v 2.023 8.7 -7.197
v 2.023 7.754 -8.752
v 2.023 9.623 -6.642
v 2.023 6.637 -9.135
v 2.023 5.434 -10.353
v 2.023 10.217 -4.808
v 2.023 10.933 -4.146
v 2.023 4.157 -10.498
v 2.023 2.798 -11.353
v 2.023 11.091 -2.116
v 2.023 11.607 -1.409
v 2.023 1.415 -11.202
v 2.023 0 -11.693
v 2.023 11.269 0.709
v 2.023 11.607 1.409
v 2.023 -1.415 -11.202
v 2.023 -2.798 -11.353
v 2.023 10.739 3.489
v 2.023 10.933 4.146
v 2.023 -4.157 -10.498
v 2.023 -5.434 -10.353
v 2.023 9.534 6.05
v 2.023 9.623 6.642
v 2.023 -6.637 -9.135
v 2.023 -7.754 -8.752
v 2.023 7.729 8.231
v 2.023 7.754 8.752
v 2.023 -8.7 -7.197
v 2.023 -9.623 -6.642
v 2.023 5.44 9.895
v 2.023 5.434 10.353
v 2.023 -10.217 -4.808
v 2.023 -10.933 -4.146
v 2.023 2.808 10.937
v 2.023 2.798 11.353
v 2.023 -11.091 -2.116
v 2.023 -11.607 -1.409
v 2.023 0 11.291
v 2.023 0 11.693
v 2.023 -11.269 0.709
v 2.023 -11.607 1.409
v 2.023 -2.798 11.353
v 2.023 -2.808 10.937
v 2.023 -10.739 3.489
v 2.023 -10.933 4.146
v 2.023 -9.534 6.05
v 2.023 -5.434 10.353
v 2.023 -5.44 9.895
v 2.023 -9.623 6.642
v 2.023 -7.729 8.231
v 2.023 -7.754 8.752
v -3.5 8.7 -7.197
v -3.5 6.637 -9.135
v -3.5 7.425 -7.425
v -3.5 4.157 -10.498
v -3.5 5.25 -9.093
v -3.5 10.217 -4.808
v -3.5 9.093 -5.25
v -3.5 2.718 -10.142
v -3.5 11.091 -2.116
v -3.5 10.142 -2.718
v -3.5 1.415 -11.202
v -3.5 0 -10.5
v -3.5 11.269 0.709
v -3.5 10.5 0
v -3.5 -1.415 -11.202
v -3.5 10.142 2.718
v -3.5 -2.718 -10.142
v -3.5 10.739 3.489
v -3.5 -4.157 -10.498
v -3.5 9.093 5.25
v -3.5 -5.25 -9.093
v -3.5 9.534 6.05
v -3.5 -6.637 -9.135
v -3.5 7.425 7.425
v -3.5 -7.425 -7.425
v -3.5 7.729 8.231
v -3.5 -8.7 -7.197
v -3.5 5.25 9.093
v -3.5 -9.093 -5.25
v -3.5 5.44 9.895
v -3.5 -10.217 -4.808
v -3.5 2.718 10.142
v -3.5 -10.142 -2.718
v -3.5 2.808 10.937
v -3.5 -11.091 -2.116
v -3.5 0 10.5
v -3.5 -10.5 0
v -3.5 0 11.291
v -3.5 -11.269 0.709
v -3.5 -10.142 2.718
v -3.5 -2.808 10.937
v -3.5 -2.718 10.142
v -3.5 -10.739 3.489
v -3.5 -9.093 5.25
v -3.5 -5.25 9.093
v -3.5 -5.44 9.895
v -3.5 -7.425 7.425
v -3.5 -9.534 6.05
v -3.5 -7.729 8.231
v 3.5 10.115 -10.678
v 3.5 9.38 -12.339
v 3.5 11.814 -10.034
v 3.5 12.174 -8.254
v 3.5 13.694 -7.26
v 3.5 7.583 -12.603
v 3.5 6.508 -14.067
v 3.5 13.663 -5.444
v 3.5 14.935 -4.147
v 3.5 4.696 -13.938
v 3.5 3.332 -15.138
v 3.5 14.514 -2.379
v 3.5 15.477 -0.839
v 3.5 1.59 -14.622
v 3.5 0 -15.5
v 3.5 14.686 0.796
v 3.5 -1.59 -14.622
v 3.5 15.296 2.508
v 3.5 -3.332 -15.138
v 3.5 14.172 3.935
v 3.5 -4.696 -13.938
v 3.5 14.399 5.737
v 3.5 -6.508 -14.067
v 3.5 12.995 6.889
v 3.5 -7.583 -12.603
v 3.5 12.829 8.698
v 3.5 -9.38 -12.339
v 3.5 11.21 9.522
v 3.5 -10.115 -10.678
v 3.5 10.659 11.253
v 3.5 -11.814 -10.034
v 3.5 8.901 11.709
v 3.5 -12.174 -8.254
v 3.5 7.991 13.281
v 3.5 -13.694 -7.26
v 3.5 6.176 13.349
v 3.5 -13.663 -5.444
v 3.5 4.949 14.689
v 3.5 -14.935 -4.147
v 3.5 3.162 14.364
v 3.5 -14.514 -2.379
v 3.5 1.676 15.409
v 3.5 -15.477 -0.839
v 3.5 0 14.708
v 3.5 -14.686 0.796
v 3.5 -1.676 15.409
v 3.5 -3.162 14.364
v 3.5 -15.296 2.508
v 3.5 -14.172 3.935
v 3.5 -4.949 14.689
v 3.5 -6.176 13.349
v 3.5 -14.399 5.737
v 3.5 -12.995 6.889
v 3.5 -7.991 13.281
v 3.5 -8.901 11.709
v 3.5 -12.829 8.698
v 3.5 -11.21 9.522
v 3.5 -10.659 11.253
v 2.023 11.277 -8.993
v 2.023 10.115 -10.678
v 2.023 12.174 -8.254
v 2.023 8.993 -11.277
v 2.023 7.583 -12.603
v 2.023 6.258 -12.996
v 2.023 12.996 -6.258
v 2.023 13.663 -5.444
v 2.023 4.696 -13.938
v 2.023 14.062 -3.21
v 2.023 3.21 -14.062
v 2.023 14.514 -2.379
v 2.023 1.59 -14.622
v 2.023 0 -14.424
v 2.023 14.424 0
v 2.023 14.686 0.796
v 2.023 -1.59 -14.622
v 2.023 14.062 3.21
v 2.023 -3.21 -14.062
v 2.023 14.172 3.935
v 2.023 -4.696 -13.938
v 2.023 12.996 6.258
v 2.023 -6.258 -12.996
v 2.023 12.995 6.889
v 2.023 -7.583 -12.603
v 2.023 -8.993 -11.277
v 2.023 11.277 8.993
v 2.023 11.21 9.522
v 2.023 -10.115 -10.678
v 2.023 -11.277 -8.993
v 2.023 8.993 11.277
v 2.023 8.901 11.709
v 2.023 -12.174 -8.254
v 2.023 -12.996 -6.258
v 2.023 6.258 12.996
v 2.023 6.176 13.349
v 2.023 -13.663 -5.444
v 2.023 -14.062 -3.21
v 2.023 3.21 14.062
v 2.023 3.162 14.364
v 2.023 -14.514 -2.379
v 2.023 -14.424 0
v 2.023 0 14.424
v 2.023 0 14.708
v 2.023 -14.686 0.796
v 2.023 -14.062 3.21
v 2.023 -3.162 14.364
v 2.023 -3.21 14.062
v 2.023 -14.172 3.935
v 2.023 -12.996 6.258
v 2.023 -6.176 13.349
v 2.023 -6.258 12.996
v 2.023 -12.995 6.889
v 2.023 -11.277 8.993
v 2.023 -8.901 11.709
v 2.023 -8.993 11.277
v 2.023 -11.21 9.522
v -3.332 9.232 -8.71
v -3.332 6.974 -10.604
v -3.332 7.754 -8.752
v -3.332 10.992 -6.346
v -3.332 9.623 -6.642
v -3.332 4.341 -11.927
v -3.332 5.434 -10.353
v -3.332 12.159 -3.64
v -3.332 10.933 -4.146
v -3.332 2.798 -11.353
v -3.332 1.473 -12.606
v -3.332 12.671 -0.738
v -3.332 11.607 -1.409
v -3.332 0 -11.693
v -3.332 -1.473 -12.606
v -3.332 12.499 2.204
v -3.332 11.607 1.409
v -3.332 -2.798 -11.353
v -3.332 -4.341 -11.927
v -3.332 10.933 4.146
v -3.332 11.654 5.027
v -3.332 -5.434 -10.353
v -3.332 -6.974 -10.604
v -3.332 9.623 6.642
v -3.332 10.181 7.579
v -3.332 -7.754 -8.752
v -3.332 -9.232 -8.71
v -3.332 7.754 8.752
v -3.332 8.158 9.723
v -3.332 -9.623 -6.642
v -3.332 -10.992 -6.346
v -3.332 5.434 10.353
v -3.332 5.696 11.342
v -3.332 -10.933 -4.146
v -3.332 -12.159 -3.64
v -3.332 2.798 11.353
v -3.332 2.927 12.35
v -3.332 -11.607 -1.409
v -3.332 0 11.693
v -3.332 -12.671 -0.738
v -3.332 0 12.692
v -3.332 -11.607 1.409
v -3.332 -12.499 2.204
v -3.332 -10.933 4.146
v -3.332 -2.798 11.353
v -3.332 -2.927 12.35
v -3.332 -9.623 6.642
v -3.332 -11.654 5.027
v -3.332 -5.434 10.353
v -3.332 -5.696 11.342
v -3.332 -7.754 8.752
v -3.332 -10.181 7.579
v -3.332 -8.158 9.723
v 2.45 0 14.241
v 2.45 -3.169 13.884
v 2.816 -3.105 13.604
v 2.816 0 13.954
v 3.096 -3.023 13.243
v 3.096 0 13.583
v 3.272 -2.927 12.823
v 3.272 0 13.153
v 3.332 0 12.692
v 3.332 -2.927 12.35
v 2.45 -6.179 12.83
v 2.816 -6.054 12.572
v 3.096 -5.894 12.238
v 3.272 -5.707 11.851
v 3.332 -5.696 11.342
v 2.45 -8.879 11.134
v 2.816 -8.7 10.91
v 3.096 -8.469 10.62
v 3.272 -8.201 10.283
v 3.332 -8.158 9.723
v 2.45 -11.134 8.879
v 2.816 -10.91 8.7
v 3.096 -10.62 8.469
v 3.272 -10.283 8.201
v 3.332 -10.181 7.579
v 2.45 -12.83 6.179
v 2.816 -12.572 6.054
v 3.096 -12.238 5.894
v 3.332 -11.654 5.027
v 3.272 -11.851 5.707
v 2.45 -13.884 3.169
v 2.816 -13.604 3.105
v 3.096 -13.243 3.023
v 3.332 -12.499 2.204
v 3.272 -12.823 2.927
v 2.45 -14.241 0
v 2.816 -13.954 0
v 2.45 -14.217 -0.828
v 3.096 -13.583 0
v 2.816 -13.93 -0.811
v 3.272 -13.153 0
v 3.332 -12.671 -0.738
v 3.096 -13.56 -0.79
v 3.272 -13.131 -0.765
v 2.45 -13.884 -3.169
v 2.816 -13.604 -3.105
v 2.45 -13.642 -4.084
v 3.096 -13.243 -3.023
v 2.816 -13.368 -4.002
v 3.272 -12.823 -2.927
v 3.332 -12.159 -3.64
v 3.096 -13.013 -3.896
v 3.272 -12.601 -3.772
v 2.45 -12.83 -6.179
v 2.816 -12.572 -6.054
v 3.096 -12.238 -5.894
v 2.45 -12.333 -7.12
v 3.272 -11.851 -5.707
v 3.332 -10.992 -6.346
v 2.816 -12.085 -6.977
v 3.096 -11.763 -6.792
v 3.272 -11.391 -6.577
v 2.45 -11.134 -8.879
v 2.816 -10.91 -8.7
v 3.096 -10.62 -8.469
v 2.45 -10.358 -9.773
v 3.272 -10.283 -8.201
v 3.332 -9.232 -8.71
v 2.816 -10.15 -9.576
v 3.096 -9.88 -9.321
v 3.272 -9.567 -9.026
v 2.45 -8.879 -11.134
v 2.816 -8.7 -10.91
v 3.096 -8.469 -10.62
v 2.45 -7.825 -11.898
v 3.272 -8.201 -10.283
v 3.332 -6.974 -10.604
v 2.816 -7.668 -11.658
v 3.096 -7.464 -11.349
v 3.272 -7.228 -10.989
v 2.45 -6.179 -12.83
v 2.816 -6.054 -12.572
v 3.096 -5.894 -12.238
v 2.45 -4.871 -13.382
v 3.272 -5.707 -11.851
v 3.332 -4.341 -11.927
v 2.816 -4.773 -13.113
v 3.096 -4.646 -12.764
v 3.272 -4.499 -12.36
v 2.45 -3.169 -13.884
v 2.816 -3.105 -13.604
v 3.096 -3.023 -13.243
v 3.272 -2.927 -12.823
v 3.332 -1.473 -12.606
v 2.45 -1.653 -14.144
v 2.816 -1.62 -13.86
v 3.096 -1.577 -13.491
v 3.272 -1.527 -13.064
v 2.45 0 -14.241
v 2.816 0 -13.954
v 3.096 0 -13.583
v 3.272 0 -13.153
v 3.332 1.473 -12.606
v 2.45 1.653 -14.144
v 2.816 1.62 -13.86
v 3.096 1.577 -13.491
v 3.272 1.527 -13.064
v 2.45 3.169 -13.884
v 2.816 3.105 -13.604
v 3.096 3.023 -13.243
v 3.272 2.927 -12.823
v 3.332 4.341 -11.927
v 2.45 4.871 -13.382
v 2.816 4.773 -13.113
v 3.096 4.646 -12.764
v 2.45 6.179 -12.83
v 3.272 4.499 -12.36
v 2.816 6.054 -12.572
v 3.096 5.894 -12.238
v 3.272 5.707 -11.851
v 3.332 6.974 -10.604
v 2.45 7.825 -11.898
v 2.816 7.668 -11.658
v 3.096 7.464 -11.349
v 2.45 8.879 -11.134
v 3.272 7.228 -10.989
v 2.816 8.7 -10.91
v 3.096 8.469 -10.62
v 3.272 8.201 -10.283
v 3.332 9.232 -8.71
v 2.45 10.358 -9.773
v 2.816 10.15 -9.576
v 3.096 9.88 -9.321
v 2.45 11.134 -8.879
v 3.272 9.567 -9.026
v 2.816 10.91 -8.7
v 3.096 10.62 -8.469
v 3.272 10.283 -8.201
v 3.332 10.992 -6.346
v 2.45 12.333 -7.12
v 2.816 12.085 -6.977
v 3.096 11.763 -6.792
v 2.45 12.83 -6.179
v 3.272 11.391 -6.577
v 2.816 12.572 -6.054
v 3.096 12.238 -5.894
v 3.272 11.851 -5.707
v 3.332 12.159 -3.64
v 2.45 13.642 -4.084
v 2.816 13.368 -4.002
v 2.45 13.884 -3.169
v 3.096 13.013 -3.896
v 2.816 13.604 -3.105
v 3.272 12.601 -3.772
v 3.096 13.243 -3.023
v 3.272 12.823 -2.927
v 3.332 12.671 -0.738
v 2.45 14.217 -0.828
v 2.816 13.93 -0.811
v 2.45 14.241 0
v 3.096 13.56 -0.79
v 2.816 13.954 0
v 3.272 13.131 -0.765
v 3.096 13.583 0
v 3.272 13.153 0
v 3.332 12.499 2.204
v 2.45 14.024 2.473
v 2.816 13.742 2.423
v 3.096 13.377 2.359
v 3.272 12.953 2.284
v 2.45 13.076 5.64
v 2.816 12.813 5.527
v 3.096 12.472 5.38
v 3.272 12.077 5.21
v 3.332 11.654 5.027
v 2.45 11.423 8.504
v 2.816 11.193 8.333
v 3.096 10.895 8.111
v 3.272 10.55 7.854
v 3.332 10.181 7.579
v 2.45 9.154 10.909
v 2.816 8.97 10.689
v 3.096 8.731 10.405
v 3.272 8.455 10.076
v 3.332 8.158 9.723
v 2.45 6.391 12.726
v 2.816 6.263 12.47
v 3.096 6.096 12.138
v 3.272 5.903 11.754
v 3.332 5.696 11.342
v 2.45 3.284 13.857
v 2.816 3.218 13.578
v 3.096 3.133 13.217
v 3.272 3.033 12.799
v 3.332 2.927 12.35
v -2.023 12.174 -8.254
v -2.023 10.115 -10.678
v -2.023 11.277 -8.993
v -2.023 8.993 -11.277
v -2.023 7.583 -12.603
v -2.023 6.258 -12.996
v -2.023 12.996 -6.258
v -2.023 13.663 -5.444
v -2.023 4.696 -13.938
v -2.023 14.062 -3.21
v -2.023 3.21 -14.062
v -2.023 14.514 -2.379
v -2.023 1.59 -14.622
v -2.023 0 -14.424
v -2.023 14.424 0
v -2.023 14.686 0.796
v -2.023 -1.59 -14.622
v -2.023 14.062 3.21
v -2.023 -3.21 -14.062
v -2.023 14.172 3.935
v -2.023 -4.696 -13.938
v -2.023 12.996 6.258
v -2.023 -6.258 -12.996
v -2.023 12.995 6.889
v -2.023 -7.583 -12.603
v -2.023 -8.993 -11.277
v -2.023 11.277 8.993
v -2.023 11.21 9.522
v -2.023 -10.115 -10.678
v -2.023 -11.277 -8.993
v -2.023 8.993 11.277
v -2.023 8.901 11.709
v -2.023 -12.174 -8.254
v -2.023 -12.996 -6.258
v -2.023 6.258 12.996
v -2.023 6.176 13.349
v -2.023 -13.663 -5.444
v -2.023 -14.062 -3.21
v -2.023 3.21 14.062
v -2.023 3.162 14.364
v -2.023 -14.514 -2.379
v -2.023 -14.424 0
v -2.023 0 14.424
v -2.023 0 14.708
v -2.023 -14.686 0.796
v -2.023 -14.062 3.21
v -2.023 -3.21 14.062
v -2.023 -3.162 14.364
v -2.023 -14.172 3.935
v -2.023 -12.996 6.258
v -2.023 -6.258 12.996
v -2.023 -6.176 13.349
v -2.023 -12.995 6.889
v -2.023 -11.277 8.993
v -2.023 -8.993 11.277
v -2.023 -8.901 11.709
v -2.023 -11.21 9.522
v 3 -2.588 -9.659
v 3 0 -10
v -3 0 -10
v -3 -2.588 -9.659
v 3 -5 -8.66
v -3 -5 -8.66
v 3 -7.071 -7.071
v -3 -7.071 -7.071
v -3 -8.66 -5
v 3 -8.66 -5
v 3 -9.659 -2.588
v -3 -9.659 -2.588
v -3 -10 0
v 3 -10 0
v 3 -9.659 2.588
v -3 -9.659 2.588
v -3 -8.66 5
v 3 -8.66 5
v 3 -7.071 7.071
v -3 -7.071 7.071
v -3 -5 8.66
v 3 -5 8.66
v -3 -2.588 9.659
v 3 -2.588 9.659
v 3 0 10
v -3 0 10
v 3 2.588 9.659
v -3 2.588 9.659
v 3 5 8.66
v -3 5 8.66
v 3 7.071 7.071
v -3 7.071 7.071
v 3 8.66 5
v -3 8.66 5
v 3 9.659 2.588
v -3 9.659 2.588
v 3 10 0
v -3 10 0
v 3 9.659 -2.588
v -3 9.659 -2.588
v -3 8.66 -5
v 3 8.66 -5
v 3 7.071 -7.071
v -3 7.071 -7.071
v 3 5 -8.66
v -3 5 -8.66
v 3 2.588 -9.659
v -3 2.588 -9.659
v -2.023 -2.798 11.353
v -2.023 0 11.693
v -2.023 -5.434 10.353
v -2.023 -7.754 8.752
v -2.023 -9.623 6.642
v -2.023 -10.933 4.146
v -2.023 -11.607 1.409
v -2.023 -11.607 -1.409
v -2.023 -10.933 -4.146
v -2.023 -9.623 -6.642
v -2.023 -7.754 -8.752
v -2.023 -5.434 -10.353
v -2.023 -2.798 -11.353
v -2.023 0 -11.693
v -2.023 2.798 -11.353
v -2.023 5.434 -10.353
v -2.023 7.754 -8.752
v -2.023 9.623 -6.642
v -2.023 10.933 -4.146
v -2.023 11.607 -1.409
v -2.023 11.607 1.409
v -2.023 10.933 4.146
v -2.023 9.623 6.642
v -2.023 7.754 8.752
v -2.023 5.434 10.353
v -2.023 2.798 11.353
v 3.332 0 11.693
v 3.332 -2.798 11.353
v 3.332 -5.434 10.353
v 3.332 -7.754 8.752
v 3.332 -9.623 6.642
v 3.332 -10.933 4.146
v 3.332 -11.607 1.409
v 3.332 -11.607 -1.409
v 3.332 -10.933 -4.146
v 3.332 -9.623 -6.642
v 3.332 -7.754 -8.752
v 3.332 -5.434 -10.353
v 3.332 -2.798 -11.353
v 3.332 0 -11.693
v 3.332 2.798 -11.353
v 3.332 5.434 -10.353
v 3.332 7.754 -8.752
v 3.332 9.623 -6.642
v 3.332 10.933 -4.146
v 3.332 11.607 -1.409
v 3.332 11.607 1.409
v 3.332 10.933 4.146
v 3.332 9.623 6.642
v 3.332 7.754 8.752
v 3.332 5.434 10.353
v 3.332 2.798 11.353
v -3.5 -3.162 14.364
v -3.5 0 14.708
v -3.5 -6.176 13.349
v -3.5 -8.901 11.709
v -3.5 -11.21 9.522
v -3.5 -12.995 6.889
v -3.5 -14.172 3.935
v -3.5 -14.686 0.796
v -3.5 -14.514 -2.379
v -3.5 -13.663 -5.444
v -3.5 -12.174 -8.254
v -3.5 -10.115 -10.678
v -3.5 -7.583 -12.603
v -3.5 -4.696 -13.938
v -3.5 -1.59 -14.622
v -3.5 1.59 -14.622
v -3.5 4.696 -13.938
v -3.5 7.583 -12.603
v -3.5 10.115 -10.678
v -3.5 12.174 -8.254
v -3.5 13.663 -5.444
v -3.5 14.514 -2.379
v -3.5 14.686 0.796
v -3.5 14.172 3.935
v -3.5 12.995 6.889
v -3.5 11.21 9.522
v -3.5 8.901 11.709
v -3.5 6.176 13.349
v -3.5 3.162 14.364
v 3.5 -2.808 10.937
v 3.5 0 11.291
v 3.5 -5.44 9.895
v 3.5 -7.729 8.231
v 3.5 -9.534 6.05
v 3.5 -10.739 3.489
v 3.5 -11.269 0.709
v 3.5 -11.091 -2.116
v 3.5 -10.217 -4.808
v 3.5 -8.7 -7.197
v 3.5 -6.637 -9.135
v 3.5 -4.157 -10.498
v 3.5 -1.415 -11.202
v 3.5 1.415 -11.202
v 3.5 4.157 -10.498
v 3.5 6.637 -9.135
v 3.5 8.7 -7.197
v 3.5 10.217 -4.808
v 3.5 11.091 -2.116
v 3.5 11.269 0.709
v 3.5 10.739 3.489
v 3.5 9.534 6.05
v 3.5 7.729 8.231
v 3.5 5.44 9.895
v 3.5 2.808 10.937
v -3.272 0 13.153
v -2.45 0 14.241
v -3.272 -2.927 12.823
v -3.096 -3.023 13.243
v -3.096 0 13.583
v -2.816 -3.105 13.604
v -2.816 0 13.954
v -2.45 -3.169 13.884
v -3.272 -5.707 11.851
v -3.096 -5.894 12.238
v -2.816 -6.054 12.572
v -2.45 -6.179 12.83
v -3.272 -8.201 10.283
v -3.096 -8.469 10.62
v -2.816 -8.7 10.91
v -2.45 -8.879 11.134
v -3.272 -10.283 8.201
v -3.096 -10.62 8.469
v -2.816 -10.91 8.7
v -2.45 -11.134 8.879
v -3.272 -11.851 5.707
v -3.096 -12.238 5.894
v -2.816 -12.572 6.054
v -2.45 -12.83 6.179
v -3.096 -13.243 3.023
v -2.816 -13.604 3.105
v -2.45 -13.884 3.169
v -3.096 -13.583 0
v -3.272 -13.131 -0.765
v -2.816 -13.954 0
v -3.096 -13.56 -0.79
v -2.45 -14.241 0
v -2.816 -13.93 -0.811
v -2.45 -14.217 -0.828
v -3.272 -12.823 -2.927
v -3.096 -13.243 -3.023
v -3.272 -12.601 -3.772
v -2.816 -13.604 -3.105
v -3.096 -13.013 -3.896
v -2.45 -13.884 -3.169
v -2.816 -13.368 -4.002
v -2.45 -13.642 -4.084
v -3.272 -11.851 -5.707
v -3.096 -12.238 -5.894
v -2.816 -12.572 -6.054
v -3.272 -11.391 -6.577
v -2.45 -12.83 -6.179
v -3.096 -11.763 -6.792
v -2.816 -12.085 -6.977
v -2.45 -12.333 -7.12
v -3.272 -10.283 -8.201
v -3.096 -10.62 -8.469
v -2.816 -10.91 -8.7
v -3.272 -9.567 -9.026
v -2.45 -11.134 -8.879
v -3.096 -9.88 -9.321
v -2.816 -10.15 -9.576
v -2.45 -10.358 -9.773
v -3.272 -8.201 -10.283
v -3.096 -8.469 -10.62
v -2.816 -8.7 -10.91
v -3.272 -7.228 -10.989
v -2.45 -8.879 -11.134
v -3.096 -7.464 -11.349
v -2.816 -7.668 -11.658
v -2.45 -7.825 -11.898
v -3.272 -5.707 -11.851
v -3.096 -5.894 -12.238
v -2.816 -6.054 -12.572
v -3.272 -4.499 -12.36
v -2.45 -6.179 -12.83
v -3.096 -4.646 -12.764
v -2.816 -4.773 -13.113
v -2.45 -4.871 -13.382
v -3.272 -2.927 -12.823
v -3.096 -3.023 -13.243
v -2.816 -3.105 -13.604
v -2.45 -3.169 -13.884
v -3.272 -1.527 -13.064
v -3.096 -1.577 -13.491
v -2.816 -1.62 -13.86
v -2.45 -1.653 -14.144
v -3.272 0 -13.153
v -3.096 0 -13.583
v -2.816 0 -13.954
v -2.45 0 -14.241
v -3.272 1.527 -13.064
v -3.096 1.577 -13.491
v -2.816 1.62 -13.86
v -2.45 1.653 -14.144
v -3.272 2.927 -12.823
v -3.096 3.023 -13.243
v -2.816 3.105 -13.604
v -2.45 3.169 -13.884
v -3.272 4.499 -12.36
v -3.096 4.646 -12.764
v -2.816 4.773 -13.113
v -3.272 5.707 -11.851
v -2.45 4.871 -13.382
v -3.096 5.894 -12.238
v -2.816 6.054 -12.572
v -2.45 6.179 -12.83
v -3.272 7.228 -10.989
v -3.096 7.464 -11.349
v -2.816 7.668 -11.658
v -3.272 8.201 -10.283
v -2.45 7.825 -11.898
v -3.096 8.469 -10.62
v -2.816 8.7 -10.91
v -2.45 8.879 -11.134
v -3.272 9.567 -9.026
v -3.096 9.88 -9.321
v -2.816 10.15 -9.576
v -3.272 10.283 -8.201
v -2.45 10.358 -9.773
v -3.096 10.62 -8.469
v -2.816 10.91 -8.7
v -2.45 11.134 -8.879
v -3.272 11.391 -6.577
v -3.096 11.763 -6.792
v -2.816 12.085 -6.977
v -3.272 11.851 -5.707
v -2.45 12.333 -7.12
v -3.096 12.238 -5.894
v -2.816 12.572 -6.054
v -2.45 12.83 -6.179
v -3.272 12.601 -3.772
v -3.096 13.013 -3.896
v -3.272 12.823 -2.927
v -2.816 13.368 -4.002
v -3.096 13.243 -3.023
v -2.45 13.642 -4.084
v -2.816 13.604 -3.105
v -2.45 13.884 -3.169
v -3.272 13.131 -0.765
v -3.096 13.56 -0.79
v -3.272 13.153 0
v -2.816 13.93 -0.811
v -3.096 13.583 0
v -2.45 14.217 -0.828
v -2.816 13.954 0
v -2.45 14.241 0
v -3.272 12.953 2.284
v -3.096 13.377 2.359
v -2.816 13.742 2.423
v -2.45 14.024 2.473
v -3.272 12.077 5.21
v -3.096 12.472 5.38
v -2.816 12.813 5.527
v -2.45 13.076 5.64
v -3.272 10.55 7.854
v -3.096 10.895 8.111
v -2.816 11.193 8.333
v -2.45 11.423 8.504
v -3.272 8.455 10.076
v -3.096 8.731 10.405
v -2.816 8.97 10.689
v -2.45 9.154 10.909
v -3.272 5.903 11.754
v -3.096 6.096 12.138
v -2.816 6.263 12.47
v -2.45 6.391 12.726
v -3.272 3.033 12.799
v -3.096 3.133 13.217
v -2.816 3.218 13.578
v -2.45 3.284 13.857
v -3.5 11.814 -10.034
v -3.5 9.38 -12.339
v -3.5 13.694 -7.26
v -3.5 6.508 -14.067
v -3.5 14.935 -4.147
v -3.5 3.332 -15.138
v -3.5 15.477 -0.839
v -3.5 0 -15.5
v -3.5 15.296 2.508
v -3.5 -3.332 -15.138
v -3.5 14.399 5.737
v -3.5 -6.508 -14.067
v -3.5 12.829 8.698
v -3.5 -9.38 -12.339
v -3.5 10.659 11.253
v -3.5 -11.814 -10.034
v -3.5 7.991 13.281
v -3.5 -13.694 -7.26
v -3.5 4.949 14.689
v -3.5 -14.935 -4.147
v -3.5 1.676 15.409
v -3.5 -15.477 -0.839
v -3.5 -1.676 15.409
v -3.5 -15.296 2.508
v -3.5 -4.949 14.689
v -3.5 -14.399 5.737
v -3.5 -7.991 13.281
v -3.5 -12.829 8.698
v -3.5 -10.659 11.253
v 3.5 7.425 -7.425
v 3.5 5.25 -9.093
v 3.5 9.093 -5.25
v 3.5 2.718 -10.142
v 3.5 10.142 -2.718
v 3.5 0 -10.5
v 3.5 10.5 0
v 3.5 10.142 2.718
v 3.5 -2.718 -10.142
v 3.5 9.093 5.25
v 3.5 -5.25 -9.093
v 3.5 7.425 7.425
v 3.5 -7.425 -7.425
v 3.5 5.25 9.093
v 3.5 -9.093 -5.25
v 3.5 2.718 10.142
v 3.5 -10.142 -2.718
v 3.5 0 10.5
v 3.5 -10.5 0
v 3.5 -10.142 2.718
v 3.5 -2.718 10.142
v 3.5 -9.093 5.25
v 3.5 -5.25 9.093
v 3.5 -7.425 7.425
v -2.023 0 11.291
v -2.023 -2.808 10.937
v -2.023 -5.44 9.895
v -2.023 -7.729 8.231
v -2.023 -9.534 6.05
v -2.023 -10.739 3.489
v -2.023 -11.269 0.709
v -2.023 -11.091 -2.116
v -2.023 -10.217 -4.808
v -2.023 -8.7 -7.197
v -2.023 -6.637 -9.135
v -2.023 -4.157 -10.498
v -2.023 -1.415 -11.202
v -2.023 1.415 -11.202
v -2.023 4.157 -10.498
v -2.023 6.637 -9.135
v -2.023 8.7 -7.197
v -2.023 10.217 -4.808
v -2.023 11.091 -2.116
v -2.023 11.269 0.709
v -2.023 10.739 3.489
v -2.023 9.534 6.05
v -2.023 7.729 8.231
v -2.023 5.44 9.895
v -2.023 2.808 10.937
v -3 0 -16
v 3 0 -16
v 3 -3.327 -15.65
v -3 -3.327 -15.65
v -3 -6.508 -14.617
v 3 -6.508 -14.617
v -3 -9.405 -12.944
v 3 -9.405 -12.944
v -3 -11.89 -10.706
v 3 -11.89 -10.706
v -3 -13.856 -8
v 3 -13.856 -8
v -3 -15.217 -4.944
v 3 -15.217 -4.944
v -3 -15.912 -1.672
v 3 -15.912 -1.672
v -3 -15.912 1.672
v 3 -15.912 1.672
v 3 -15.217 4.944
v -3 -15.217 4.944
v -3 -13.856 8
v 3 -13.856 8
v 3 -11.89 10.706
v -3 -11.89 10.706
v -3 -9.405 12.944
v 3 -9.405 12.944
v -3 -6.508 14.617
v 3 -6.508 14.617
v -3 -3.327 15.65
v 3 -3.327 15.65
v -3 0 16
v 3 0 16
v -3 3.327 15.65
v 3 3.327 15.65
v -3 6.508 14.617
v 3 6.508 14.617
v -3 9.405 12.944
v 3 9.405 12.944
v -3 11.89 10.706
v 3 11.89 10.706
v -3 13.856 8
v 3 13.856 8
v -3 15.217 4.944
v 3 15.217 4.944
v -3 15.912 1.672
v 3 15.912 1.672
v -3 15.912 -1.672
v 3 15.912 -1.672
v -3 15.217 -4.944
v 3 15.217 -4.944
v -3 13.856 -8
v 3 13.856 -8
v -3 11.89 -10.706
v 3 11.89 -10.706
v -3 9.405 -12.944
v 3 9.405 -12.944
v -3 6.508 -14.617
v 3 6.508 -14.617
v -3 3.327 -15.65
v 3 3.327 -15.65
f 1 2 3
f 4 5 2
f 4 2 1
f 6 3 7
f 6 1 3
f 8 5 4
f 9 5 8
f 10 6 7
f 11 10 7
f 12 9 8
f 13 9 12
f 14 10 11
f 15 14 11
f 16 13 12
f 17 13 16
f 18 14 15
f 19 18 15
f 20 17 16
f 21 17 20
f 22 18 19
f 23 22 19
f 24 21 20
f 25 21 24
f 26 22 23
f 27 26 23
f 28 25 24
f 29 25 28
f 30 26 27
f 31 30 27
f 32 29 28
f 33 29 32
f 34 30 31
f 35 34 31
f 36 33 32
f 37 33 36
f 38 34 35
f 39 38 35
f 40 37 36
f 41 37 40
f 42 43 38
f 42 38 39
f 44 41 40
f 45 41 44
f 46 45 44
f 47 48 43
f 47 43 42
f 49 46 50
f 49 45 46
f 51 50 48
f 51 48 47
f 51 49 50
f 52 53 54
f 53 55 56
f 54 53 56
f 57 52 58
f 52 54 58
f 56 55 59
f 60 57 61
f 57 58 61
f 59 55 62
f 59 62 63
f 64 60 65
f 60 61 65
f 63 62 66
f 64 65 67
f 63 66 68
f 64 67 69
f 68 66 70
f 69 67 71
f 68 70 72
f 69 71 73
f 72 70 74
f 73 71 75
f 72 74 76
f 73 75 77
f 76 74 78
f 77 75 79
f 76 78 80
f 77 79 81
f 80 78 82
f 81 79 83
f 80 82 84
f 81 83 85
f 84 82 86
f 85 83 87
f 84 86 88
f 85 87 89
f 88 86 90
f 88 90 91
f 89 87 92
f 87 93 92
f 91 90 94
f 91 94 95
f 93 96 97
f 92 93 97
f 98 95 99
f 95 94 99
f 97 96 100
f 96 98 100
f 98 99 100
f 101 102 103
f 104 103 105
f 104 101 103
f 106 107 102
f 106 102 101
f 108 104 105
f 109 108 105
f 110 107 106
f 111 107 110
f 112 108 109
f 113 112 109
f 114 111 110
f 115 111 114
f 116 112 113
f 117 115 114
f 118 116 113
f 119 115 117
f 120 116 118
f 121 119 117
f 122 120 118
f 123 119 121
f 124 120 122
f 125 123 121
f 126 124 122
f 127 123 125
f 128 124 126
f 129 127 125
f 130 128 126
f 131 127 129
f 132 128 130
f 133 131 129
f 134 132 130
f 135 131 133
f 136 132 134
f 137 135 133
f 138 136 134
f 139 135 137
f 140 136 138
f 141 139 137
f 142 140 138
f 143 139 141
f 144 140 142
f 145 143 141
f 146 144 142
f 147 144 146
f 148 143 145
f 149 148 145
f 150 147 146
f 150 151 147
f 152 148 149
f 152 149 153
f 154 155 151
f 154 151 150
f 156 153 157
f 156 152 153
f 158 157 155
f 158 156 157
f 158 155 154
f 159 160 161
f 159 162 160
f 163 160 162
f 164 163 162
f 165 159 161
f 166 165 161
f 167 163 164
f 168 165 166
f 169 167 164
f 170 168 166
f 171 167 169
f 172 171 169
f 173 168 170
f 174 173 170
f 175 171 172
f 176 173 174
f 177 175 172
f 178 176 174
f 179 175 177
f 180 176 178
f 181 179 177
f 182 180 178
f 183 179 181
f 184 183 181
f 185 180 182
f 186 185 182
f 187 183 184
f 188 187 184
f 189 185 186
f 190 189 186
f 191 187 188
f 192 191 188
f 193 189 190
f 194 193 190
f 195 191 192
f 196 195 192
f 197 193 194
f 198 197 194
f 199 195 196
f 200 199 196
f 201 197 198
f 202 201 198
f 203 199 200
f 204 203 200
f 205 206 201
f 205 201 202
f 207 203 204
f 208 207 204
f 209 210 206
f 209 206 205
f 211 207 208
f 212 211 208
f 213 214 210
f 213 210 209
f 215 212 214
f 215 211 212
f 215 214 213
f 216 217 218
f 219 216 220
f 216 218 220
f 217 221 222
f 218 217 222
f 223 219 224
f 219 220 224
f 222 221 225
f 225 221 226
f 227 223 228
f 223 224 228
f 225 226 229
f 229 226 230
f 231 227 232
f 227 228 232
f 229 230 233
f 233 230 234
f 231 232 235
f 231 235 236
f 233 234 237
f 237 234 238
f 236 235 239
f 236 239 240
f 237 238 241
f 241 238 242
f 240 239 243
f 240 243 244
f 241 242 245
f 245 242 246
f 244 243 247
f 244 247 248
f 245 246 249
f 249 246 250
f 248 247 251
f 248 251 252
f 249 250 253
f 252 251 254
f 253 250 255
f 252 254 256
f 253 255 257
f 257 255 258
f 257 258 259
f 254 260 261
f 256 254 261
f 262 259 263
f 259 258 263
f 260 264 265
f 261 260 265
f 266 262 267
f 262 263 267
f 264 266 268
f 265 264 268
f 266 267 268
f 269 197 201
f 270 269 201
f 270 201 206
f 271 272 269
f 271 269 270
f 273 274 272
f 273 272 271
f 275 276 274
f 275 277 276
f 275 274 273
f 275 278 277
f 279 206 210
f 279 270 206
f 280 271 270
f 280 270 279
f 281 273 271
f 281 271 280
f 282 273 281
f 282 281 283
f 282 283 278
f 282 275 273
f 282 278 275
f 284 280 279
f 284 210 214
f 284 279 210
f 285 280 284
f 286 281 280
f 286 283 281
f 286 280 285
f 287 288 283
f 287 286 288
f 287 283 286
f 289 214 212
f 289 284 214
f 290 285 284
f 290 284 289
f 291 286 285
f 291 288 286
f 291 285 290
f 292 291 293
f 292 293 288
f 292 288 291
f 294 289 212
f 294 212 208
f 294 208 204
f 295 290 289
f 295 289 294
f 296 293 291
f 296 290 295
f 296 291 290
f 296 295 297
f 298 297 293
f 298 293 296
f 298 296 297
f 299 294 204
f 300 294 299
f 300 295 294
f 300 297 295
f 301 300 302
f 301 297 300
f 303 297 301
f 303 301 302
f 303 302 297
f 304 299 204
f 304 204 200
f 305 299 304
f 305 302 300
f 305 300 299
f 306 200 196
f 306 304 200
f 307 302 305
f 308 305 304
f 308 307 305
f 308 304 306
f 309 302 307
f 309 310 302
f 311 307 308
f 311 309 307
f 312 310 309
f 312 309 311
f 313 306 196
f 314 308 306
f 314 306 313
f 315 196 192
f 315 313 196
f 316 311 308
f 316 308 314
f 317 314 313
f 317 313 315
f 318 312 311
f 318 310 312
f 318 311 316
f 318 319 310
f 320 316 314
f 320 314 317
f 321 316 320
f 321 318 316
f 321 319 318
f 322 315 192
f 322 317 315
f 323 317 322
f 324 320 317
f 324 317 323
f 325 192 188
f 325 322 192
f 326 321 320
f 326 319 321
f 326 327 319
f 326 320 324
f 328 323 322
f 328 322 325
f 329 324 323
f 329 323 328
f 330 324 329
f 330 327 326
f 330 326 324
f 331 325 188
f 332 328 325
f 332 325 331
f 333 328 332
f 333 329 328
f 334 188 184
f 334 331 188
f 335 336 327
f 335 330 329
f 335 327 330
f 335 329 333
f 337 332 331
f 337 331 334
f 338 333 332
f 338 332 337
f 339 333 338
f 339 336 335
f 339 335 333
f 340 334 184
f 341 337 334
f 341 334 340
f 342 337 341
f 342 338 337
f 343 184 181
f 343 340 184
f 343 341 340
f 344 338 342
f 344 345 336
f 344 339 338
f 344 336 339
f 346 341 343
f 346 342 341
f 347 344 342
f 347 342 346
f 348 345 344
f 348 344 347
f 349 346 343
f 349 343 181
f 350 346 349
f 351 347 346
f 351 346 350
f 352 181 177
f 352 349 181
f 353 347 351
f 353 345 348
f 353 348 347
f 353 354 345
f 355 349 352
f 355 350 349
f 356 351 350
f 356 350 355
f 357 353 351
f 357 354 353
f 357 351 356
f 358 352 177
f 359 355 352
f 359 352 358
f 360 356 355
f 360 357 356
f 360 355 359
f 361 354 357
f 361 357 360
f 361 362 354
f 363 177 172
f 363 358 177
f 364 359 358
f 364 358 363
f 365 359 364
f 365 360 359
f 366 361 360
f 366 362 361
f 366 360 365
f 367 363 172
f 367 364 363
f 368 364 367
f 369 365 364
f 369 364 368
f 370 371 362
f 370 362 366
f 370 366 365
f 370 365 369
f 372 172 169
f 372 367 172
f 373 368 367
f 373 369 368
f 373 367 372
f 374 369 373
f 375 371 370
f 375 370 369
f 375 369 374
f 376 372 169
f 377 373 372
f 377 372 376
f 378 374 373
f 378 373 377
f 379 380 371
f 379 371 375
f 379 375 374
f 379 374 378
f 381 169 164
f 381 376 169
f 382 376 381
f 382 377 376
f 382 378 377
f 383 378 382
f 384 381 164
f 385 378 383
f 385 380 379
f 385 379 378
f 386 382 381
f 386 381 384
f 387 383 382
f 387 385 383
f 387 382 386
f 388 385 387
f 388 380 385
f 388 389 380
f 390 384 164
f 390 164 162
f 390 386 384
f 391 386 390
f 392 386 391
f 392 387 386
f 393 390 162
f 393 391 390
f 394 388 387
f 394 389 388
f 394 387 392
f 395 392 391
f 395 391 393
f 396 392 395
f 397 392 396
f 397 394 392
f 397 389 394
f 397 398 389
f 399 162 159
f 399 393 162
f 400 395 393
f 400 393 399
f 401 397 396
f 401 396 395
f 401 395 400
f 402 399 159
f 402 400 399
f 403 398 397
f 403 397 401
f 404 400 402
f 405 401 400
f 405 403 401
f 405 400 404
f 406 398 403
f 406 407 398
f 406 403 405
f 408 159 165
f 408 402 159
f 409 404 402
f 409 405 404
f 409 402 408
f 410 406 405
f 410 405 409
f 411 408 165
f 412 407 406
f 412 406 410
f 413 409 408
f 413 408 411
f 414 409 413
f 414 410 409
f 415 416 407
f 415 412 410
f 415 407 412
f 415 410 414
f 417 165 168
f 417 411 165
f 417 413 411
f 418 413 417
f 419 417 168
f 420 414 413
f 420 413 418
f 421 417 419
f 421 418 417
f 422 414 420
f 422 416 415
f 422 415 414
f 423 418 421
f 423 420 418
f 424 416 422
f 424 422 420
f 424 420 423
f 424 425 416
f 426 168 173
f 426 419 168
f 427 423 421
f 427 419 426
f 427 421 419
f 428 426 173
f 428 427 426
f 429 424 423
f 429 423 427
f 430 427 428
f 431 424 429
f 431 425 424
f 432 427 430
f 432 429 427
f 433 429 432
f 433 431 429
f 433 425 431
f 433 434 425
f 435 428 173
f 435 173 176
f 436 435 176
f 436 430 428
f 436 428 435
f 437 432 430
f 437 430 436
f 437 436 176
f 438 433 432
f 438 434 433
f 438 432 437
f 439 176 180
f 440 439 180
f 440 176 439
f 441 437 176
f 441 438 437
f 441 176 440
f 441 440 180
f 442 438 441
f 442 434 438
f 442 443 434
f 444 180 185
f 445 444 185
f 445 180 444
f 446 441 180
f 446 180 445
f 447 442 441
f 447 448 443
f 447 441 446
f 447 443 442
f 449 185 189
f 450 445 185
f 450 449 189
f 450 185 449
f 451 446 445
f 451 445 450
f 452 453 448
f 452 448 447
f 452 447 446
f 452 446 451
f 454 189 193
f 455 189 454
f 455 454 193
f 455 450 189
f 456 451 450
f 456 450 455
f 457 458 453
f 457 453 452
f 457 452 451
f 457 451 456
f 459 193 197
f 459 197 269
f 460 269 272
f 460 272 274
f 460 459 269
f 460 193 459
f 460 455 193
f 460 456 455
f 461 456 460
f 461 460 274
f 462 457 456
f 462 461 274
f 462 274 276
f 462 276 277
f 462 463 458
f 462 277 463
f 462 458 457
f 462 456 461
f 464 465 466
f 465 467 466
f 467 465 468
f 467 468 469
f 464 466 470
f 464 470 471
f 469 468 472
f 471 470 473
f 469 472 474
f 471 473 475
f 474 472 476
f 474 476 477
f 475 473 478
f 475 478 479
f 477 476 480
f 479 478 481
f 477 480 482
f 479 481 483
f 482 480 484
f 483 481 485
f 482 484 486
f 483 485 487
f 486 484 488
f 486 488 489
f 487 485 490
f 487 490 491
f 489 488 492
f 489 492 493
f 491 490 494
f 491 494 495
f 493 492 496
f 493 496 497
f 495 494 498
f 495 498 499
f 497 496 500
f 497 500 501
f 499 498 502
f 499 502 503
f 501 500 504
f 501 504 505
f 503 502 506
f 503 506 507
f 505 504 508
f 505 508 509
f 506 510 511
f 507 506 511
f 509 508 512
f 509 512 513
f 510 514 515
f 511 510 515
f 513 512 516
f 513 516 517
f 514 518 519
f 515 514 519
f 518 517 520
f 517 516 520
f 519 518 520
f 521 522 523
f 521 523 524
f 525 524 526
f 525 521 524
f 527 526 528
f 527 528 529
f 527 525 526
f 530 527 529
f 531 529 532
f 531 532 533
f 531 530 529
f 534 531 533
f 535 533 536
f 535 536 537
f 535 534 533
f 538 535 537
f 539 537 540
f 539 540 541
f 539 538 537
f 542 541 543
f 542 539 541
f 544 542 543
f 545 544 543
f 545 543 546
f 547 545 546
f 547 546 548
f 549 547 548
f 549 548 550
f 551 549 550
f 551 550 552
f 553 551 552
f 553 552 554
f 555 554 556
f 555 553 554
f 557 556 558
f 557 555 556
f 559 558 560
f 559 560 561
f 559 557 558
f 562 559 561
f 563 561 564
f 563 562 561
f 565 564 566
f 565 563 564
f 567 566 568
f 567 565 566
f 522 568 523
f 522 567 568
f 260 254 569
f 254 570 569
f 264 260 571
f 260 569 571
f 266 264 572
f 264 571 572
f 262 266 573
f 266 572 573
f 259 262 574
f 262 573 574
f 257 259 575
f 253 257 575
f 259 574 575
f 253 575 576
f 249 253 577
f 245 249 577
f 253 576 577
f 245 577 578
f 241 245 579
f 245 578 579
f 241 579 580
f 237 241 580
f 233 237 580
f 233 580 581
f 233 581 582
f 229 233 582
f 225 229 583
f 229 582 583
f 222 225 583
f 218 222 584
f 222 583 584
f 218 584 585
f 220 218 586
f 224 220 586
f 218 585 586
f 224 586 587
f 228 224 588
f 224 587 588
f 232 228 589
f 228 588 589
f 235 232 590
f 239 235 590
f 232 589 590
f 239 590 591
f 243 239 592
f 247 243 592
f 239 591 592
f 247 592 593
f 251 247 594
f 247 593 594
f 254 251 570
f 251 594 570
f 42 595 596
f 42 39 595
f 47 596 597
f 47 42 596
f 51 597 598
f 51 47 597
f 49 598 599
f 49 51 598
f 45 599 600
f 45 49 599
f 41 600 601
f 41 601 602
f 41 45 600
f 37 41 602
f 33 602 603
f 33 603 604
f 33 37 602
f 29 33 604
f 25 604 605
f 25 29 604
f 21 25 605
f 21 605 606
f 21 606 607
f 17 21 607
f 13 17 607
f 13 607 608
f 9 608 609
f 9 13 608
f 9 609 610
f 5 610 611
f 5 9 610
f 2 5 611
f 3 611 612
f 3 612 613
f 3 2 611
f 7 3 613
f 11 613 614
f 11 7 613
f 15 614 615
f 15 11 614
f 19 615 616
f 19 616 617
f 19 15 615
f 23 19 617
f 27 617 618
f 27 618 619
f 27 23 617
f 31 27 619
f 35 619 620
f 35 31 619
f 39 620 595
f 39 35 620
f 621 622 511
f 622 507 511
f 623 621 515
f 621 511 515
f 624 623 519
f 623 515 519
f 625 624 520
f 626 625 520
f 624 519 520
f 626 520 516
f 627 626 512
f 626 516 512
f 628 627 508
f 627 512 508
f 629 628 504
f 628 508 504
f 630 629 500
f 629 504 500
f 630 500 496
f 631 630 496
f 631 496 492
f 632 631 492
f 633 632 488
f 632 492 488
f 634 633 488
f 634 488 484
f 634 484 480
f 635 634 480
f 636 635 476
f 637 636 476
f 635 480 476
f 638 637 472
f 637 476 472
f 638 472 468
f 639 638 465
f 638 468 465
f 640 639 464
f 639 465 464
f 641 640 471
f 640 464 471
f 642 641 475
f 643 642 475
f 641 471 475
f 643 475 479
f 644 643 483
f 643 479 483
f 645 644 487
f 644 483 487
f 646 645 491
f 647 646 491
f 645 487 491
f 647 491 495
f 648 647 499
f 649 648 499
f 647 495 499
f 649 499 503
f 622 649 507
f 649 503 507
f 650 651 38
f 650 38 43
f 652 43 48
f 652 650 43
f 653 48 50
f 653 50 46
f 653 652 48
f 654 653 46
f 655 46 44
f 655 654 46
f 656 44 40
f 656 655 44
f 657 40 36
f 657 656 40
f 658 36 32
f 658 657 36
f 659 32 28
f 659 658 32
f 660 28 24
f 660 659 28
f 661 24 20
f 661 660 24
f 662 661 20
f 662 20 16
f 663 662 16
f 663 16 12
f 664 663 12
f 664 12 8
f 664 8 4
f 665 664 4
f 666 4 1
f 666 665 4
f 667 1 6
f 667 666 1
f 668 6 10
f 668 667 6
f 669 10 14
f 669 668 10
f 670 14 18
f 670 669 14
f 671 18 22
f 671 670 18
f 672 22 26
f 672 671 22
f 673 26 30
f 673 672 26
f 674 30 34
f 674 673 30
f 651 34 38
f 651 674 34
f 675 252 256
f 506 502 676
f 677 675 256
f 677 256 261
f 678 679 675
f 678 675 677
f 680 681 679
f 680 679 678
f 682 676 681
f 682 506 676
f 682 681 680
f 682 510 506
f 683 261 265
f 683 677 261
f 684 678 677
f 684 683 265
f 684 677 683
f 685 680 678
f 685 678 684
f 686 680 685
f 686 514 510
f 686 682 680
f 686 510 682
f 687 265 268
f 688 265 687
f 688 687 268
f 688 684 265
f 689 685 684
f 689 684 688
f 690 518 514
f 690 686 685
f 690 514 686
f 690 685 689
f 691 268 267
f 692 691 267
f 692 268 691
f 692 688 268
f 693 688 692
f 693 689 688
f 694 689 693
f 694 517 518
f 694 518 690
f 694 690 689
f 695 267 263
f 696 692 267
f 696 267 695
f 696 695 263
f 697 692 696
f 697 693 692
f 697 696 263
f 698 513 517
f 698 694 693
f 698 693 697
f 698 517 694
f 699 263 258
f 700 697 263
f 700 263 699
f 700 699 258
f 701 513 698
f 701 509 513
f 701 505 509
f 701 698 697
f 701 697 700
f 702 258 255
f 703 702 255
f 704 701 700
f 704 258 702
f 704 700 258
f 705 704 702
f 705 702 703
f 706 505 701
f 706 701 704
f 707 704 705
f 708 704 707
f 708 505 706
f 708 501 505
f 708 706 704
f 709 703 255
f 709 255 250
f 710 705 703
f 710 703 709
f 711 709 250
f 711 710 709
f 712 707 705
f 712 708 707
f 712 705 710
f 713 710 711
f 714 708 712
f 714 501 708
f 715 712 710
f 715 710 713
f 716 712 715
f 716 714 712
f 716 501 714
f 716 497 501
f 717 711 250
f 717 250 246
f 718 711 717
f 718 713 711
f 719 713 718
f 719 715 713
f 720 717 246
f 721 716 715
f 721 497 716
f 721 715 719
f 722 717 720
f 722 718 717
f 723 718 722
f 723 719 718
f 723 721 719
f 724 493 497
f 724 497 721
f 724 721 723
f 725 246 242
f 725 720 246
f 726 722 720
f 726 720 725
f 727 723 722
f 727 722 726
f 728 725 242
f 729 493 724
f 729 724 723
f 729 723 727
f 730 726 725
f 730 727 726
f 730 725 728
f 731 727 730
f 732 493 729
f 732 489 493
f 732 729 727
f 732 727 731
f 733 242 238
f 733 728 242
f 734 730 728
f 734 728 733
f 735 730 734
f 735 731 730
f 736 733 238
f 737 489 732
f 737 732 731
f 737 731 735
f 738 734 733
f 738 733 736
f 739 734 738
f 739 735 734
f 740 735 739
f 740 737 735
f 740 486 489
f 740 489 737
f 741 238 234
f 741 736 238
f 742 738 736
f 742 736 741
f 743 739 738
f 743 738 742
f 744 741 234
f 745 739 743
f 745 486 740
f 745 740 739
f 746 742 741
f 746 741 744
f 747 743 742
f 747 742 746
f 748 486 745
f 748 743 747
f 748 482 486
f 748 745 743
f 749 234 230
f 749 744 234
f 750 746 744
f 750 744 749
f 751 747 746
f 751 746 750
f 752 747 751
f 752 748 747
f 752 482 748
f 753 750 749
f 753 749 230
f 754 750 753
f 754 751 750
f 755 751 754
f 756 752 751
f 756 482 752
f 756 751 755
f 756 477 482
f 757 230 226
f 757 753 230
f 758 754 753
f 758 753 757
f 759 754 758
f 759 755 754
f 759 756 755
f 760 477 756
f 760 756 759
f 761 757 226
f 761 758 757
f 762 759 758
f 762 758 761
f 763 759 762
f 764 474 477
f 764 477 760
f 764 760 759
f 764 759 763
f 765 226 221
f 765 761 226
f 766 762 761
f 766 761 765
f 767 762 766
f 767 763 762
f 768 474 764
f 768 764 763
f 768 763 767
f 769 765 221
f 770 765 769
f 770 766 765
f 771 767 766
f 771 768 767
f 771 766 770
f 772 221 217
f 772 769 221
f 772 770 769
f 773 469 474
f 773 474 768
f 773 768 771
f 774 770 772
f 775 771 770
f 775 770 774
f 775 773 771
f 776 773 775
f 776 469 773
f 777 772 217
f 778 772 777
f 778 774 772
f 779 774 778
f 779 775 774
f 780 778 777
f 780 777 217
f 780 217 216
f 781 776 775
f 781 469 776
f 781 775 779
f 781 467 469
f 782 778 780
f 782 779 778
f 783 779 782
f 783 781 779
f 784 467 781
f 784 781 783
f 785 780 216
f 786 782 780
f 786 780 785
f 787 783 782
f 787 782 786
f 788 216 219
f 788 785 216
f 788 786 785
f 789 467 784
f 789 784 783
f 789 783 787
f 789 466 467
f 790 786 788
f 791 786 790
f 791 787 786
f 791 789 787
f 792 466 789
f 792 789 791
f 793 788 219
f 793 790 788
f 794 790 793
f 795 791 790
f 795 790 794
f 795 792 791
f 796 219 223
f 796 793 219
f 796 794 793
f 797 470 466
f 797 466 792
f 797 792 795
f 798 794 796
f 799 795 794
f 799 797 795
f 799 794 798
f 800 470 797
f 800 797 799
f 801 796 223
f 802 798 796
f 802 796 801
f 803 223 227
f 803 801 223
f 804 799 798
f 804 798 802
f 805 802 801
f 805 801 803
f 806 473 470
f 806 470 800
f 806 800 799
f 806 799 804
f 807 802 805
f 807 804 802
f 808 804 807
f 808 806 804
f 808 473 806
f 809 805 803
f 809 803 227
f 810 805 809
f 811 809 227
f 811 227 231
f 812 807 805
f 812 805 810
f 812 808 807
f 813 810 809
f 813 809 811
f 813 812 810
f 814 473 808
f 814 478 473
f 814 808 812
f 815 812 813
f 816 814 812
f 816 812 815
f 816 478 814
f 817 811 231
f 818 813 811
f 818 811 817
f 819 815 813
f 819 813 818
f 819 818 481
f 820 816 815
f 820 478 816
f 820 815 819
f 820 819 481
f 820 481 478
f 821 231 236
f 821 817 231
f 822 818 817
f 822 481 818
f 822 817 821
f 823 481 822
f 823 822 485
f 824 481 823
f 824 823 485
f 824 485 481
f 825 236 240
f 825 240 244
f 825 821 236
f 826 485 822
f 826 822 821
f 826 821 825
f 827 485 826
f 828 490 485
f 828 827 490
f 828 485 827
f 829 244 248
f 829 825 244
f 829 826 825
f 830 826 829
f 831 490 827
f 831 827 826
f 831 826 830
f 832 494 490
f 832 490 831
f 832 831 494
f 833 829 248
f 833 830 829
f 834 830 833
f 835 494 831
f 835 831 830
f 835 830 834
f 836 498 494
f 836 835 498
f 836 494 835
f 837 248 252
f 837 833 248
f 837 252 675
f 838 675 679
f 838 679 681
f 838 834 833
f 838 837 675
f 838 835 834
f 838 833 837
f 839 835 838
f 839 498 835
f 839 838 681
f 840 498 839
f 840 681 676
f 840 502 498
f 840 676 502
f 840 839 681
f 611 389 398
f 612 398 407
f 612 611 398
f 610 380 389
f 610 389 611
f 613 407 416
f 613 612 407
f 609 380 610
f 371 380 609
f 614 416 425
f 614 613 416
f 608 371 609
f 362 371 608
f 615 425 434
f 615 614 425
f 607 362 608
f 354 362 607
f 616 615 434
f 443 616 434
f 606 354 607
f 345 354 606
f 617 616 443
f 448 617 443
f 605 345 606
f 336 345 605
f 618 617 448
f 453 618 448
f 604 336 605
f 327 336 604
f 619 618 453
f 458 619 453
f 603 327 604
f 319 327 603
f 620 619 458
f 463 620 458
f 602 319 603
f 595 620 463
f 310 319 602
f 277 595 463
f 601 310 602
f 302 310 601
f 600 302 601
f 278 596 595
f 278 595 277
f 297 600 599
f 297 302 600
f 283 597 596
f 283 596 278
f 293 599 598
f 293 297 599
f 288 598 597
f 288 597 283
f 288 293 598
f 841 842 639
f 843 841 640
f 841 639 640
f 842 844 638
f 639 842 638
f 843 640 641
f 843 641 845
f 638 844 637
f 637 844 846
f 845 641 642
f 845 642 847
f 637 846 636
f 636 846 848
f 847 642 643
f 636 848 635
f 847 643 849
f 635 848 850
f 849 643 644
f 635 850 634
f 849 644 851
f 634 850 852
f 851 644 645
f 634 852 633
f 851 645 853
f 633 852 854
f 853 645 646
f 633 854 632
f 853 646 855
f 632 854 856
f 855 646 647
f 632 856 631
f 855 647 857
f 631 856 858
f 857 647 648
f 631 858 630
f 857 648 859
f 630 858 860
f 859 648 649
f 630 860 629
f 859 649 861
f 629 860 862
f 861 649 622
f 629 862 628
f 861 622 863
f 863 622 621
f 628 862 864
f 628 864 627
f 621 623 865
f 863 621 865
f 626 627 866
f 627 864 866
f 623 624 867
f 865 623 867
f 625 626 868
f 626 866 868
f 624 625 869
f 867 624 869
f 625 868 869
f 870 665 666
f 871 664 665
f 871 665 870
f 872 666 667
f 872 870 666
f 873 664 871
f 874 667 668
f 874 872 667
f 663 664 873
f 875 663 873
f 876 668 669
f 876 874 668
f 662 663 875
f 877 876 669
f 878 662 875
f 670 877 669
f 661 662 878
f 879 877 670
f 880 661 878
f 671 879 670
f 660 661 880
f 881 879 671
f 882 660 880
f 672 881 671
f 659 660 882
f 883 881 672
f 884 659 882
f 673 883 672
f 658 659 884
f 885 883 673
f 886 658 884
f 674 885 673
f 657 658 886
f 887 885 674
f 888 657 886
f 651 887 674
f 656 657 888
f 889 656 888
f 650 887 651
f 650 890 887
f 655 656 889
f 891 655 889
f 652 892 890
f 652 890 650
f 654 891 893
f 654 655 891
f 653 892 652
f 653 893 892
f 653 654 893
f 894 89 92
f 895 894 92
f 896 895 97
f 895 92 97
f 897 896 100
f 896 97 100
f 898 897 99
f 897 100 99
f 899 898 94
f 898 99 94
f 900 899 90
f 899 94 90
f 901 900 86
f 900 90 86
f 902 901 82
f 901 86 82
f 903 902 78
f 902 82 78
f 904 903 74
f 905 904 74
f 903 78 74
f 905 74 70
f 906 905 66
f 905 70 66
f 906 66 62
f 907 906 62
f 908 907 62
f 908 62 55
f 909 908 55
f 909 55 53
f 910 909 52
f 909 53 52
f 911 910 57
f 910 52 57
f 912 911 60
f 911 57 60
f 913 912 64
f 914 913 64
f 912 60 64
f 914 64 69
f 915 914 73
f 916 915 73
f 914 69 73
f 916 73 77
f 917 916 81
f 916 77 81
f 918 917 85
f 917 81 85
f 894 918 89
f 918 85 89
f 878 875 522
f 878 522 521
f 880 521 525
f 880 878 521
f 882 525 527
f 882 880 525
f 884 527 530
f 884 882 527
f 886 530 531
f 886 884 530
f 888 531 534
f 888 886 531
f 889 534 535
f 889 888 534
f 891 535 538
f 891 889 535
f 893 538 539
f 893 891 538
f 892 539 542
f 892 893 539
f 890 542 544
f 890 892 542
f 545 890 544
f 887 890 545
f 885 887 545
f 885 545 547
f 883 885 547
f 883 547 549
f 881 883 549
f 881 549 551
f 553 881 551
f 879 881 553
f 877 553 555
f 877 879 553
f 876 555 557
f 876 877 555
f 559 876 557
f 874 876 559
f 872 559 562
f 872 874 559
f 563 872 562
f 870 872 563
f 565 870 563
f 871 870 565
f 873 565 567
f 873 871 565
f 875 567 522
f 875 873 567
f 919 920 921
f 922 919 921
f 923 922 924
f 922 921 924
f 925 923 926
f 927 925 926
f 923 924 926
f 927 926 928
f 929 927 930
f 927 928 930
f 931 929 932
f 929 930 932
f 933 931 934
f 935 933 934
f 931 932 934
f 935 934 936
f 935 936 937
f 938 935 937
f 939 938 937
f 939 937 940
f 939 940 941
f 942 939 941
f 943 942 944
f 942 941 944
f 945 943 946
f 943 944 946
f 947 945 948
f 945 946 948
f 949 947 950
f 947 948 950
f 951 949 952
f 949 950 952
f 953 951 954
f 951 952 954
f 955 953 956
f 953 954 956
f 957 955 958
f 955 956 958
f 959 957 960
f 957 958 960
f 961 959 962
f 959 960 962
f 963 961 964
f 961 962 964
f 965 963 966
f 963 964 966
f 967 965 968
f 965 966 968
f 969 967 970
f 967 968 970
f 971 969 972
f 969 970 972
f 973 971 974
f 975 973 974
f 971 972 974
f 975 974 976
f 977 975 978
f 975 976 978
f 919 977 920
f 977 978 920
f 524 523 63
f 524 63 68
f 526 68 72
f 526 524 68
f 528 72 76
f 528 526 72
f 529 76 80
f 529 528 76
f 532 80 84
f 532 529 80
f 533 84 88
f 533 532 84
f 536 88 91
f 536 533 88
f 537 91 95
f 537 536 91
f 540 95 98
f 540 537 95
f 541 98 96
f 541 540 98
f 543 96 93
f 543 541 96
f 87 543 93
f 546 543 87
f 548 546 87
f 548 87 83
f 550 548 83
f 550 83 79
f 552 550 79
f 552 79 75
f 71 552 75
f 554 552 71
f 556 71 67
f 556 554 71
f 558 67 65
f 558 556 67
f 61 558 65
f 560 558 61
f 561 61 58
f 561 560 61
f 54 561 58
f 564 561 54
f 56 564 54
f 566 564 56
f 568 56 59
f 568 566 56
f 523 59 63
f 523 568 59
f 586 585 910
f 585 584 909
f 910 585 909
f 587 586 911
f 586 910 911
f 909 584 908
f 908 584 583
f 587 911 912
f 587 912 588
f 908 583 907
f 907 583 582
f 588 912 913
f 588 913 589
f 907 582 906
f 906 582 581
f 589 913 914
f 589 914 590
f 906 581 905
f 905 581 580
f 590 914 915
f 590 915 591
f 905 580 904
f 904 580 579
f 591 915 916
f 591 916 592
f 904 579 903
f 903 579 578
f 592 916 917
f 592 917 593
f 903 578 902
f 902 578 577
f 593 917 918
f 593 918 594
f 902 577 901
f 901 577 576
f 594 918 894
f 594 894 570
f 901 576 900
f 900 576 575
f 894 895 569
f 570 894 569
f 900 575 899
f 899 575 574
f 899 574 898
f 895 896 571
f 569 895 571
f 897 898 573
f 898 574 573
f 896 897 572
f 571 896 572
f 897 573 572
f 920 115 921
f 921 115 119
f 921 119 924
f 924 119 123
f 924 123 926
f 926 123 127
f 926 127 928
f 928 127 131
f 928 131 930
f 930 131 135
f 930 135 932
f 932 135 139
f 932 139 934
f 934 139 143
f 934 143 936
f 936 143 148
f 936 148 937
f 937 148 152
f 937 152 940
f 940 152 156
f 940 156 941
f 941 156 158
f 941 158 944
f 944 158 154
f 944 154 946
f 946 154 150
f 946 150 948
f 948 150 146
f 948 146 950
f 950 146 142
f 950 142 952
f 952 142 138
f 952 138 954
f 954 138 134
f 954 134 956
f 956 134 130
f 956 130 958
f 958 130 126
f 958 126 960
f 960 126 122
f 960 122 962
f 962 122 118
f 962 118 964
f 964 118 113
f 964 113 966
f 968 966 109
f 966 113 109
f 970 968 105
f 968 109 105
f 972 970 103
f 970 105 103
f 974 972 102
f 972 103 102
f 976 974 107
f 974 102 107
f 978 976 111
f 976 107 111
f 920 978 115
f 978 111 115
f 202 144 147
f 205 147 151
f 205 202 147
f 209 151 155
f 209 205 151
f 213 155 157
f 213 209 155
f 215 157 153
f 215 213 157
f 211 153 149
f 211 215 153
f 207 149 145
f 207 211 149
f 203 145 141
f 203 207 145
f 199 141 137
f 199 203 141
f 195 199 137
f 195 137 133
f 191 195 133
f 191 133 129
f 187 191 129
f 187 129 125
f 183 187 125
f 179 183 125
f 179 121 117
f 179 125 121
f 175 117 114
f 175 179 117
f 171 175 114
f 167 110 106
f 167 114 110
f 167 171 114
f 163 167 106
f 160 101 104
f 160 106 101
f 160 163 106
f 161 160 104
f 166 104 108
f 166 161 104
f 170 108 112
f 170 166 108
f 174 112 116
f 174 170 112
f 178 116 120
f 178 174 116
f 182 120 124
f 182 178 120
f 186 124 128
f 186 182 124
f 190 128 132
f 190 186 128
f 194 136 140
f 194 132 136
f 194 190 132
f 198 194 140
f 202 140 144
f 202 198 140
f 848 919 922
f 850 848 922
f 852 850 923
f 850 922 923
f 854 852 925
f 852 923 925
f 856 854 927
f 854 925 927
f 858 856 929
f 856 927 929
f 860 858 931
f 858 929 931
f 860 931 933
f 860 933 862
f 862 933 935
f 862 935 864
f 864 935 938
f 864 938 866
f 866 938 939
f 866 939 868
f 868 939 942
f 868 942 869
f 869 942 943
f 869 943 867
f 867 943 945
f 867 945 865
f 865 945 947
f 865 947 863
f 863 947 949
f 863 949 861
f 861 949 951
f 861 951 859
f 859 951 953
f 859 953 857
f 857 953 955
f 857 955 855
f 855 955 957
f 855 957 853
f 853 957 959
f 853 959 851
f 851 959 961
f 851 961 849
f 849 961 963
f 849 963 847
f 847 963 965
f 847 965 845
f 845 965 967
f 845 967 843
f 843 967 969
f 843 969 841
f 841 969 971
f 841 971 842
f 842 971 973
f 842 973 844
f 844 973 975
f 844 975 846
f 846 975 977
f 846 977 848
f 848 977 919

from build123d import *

# Parameters (mm, degrees)
SKETCH2_W     = 7
SKETCH2_H     = 6
FILLET1_R     = 1.8
CHAMFER1_SIZE = 0.5


with BuildPart() as part:
    # Sketch2 → Revolve1 (revolve)
    with BuildSketch(Plane.XY, mode=Mode.PRIVATE) as revolve1_sk:
        with Locations((0, 13)):
            Rectangle(SKETCH2_W, SKETCH2_H)
    revolve(revolve1_sk.sketch.rotate(Axis((0, 0, 0), (-1, 0, 0)), 90), axis=Axis((0, 0, 0), (-1, 0, 0)))

    # Sketch4 → Cut-Revolve1 (revolve, cut)
    with BuildSketch(Plane.XY, mode=Mode.PRIVATE) as cut_revolve1_sk:
        Polygon((6.594167107, 14.707924858), (2.022867053, 14.707924858), (2.022867053, 14.424029148), (3.332429366, 14.424029148), (3.332429366, 11.692719364), (2.022867053, 11.692719364), (2.022867053, 11.291318583), (6.594167107, 11.291318583), align=None)
        Polygon((-6.594167107, 11.291318583), (-6.594167107, 14.707924858), (-2.022867053, 14.707924858), (-2.022867053, 14.424029148), (-3.332429366, 14.424029148), (-3.332429366, 11.692719364), (-2.022867053, 11.692719364), (-2.022867053, 11.291318583), align=None)
    revolve(cut_revolve1_sk.sketch.rotate(Axis((0, 0, 0), (1, 0, 0)), 90), axis=Axis((0, 0, 0), (1, 0, 0)), mode=Mode.SUBTRACT)

    # Fillet1
    # the kernel refuses this fillet: 1.8 mm, written as the material it takes off along each edge
    with BuildSketch(Plane(origin=(3.332429366, 0, 0), x_dir=(0, 0, 1), z_dir=(0, 1, 0))) as fillet1_piece_1:
        with BuildLine():
            CenterArc((12.692131092, -1.8), FILLET1_R, 15.811024237, 74.188975763)
            Line((12.692131092, 0), (12.692131092, 0.036))
            Line((12.692131092, 0.036), (14.424029148, 0.036))
            Line((14.424029148, 0.036), (14.460029148, 0))
            ThreePointArc((14.460029148, 0), (14.460029148, -0.654781157), (14.458667109, -1.299753559))
            Line((14.458667109, -1.299753559), (14.424029148, -1.309562313))
        make_face()
    revolve(axis=Axis((3.332429366, 0, 0), (1, 0, 0)), mode=Mode.SUBTRACT)
    with BuildSketch(Plane(origin=(-3.332429366, 0, 0), x_dir=(0, 0, 1), z_dir=(0, 1, 0))) as fillet1_piece_2:
        with BuildLine():
            CenterArc((12.692131092, 1.8), FILLET1_R, 270, 74.188975763)
            Line((12.692131092, 0), (12.692131092, -0.036))
            Line((12.692131092, -0.036), (14.424029148, -0.036))
            Line((14.424029148, -0.036), (14.460029148, 0))
            ThreePointArc((14.460029148, 0), (14.460029148, 0.654781157), (14.458667109, 1.299753559))
            Line((14.458667109, 1.299753559), (14.424029148, 1.309562313))
        make_face()
    revolve(axis=Axis((-3.332429366, 0, 0), (1, 0, 0)), mode=Mode.SUBTRACT)

    # Chamfer1
    chamfer1_edges = [part.edges().sort_by_distance(p)[0] for p in [
        (3.5, 0, 10),
        (-3.5, 0, 10),
        (-3.5, 0, 16),
        (3.5, 0, 16),
    ]]
    chamfer(chamfer1_edges, length=CHAMFER1_SIZE)


solid = part.part
